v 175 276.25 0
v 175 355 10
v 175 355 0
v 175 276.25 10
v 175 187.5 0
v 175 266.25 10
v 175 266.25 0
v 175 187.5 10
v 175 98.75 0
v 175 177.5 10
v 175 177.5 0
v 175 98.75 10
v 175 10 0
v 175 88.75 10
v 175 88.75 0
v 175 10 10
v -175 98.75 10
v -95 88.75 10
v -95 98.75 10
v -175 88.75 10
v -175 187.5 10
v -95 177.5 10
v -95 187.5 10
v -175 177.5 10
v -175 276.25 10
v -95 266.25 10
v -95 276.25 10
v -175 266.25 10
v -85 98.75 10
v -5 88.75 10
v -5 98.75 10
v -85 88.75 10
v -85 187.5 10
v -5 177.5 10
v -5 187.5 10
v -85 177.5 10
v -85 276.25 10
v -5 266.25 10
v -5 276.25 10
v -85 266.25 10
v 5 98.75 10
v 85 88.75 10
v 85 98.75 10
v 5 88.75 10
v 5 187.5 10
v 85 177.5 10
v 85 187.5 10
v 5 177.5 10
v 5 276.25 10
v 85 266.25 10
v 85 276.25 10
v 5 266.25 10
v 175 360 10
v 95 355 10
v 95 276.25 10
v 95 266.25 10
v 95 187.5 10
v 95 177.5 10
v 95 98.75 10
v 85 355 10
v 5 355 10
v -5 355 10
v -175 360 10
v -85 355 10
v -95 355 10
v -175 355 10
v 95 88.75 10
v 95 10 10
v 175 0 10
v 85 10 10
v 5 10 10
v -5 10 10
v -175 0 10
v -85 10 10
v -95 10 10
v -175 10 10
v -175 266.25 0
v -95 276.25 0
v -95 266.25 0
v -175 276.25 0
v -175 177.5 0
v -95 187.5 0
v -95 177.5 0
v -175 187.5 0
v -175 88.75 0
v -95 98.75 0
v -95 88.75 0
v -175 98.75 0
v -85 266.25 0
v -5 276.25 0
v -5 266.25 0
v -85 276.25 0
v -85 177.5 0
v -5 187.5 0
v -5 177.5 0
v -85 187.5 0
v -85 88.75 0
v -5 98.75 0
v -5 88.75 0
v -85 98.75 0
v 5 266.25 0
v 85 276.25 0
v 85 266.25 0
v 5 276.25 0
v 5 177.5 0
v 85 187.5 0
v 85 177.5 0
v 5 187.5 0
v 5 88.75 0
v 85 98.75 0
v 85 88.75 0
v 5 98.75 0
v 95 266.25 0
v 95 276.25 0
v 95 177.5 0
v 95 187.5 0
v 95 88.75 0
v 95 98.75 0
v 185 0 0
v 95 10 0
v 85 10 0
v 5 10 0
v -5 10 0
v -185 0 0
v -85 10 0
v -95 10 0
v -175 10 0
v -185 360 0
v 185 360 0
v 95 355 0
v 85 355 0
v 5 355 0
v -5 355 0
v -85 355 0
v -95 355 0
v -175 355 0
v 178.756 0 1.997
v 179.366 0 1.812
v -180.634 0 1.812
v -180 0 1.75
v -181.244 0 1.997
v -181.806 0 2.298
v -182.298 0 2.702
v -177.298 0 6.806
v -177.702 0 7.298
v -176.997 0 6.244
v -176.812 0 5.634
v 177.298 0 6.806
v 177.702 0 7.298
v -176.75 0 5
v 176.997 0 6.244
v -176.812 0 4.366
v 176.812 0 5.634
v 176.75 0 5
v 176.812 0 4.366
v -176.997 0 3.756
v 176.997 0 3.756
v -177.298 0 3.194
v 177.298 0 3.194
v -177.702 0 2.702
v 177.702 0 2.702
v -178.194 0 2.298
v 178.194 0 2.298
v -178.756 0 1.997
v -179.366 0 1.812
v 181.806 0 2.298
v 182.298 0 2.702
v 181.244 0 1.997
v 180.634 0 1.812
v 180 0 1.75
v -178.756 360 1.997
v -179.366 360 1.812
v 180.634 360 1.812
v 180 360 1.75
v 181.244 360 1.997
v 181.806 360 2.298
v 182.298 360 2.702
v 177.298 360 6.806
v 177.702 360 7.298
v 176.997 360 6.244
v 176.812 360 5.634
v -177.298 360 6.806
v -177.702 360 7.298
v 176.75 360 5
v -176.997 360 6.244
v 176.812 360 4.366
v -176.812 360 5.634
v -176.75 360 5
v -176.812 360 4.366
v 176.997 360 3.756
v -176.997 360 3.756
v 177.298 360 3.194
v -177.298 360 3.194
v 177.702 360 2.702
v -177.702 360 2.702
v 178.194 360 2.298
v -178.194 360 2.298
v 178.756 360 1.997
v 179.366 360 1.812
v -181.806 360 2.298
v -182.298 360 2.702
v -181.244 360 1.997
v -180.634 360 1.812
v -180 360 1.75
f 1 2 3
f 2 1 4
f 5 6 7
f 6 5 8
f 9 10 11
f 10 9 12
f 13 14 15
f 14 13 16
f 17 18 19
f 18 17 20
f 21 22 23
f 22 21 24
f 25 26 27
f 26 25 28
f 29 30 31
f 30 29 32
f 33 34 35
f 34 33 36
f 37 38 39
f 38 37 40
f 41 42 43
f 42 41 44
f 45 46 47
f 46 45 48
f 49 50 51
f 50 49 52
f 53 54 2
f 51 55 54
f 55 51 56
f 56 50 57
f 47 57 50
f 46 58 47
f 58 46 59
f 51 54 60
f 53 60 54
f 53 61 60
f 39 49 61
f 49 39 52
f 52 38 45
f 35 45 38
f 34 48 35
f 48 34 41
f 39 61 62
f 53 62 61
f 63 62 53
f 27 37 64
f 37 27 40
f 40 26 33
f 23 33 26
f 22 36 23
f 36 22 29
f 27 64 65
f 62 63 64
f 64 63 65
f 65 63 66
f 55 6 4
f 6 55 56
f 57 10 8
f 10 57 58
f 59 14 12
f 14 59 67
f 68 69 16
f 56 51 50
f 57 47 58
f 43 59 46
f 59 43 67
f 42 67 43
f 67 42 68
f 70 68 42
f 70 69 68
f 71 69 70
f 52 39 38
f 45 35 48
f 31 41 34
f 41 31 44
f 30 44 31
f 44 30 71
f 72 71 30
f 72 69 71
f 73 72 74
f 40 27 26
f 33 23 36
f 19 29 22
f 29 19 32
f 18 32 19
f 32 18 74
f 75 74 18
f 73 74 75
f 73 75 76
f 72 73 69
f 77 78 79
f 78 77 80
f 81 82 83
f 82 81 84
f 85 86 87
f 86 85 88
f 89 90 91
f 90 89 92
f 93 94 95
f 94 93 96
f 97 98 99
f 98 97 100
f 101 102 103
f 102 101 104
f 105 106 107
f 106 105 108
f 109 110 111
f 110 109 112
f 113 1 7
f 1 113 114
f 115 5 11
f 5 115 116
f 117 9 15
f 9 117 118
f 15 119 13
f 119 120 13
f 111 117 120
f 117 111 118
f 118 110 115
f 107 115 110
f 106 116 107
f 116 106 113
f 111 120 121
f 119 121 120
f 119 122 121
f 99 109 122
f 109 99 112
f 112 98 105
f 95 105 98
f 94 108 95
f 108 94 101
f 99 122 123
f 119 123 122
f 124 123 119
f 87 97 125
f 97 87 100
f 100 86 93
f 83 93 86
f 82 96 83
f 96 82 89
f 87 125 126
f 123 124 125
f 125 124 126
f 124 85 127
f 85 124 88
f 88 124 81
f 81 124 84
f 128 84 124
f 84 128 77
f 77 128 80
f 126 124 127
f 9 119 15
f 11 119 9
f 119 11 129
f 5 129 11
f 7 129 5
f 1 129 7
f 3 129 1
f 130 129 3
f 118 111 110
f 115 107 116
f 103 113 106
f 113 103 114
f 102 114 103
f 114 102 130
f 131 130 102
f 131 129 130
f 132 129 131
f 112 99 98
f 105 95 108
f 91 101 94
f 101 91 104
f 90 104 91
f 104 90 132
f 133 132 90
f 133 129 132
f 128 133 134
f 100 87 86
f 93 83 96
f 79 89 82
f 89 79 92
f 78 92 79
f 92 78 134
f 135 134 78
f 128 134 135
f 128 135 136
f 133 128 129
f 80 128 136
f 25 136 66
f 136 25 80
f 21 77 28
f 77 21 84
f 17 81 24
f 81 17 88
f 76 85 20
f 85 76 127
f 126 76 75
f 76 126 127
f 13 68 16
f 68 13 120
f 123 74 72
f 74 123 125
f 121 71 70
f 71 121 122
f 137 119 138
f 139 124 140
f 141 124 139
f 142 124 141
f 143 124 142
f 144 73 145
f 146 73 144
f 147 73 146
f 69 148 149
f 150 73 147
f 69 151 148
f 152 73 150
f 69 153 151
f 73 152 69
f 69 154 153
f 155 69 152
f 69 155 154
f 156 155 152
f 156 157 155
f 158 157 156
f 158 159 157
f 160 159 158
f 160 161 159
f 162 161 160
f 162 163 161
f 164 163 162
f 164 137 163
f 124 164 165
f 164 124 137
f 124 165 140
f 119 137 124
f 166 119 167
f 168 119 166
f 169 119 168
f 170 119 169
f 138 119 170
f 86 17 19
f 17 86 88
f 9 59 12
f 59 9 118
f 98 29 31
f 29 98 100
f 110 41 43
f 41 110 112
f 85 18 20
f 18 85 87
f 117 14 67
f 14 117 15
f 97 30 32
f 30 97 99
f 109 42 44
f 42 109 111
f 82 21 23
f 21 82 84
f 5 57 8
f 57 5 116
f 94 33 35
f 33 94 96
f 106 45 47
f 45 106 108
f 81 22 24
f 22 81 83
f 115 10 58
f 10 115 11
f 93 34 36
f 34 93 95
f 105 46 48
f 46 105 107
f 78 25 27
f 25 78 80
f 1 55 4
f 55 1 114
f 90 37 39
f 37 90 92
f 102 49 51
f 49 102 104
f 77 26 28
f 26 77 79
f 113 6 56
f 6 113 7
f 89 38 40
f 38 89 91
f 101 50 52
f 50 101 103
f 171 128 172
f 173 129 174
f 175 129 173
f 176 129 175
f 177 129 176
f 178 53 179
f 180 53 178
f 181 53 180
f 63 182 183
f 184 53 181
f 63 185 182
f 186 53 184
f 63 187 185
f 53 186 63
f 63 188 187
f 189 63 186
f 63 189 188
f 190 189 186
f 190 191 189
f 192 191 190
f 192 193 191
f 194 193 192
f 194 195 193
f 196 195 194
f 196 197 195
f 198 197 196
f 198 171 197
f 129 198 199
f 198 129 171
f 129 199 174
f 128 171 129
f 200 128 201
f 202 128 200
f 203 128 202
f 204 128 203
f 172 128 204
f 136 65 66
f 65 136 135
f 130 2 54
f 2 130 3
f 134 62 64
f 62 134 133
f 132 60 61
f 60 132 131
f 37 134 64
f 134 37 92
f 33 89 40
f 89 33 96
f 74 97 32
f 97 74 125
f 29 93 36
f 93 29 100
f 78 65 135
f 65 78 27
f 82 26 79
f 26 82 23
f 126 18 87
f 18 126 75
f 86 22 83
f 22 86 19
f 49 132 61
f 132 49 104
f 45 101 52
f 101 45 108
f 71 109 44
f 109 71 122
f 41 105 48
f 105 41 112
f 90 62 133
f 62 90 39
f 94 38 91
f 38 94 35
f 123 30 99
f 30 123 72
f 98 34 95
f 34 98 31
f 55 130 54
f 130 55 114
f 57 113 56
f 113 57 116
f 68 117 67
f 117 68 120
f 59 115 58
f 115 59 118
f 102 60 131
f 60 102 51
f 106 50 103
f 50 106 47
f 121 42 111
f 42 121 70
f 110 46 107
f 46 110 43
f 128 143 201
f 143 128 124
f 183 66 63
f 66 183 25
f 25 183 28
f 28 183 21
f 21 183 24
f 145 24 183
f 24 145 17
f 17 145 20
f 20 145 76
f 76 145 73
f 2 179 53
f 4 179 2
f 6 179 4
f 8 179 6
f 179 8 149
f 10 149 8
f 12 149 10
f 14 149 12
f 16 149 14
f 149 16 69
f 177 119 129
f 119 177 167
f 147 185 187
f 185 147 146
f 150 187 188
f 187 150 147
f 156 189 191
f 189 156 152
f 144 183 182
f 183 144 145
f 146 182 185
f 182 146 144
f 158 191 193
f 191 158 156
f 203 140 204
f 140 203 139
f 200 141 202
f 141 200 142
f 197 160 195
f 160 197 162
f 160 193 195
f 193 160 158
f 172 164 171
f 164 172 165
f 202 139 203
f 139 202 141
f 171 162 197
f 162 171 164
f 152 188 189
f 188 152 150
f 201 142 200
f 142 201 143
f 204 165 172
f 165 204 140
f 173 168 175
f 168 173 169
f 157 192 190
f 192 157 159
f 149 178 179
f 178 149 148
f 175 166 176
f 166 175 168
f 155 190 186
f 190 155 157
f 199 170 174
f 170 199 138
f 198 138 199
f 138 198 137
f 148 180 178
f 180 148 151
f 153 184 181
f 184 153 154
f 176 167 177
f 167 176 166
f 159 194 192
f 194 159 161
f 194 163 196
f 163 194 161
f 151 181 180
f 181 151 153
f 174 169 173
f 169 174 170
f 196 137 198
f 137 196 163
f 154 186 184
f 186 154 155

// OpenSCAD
module cage_panel() {
    // Dimensions
    width = 370;
    height = 360;
    thick = 10;
    bar_size = 10;
    hole_rad = 3.25; // 6.5mm diameter clearance for M6

    // Y-positions of horizontal bars (Centers)
    // Calculated to be uniform: 5, 93.75, 182.5, 271.25, 360
    // Bar 0: Y=0..10 (Full bar)
    // Bar 4: Y=355..360 (Half bar at top)
    bar_centers = [5, 93.75, 182.5, 271.25, 360];

    // X-positions of vertical bars (Centers)
    // -180 (Left Col), -90, 0, 90, 180 (Right Col)
    // Inner bars at -90, 0, 90
    vert_centers = [-90, 0, 90];

    difference() {
        union() {
            // 1. Left Column (Mitered)
            // Extrudes along Y. Profile in XZ.
            // Outer corner at X=-185. Inner corner at X=-175.
            // Miter slope: At Z=0 (Outer), X=-185. At Z=10 (Inner), X=-175.
            translate([0, height/2, 0]) rotate([90, 0, 0]) linear_extrude(height, center=true)
                polygon(points=[[-185, 0], [-175, 0], [-175, 10], [-185, 0]]);

            // 2. Right Column (Mitered)
            translate([0, height/2, 0]) rotate([90, 0, 0]) linear_extrude(height, center=true)
                polygon(points=[[185, 0], [175, 0], [175, 10], [185, 0]]);

            // 3. Horizontal Bars
            for (i = [0 : 4]) {
                y_c = bar_centers[i];
                // Determine bar height and offset based on position
                // Bottom bar (i=0): Full 10mm, Center 5. Range 0..10
                // Top bar (i=4): Half 5mm, Center 360? No, Range 355..360.
                // Others: Full 10mm.
                
                b_h = (i == 4) ? 5 : 10;
                y_pos = (i == 4) ? 357.5 : y_c;
                
                // Bar spans between columns (-175 to 175)
                translate([0, y_pos, thick/2]) 
                    cube([350, b_h, thick], center=true);
            }

            // 4. Intermediate Vertical Bars
            for (x_c = vert_centers) {
                translate([x_c, height/2, thick/2])
                    cube([bar_size, height, thick], center=true);
            }
        }

        // Subtract Holes for Threaded Rods
        // Located at the center of the corner bars (-180, 5) and (180, 5)
        // Running along Y axis
        translate([-180, height/2, 5]) rotate([90, 0, 0]) 
            cylinder(r=hole_rad, h=height+1, center=true, $fn=32);
        
        translate([180, height/2, 5]) rotate([90, 0, 0]) 
            cylinder(r=hole_rad, h=height+1, center=true, $fn=32);
    }
}

cage_panel();
